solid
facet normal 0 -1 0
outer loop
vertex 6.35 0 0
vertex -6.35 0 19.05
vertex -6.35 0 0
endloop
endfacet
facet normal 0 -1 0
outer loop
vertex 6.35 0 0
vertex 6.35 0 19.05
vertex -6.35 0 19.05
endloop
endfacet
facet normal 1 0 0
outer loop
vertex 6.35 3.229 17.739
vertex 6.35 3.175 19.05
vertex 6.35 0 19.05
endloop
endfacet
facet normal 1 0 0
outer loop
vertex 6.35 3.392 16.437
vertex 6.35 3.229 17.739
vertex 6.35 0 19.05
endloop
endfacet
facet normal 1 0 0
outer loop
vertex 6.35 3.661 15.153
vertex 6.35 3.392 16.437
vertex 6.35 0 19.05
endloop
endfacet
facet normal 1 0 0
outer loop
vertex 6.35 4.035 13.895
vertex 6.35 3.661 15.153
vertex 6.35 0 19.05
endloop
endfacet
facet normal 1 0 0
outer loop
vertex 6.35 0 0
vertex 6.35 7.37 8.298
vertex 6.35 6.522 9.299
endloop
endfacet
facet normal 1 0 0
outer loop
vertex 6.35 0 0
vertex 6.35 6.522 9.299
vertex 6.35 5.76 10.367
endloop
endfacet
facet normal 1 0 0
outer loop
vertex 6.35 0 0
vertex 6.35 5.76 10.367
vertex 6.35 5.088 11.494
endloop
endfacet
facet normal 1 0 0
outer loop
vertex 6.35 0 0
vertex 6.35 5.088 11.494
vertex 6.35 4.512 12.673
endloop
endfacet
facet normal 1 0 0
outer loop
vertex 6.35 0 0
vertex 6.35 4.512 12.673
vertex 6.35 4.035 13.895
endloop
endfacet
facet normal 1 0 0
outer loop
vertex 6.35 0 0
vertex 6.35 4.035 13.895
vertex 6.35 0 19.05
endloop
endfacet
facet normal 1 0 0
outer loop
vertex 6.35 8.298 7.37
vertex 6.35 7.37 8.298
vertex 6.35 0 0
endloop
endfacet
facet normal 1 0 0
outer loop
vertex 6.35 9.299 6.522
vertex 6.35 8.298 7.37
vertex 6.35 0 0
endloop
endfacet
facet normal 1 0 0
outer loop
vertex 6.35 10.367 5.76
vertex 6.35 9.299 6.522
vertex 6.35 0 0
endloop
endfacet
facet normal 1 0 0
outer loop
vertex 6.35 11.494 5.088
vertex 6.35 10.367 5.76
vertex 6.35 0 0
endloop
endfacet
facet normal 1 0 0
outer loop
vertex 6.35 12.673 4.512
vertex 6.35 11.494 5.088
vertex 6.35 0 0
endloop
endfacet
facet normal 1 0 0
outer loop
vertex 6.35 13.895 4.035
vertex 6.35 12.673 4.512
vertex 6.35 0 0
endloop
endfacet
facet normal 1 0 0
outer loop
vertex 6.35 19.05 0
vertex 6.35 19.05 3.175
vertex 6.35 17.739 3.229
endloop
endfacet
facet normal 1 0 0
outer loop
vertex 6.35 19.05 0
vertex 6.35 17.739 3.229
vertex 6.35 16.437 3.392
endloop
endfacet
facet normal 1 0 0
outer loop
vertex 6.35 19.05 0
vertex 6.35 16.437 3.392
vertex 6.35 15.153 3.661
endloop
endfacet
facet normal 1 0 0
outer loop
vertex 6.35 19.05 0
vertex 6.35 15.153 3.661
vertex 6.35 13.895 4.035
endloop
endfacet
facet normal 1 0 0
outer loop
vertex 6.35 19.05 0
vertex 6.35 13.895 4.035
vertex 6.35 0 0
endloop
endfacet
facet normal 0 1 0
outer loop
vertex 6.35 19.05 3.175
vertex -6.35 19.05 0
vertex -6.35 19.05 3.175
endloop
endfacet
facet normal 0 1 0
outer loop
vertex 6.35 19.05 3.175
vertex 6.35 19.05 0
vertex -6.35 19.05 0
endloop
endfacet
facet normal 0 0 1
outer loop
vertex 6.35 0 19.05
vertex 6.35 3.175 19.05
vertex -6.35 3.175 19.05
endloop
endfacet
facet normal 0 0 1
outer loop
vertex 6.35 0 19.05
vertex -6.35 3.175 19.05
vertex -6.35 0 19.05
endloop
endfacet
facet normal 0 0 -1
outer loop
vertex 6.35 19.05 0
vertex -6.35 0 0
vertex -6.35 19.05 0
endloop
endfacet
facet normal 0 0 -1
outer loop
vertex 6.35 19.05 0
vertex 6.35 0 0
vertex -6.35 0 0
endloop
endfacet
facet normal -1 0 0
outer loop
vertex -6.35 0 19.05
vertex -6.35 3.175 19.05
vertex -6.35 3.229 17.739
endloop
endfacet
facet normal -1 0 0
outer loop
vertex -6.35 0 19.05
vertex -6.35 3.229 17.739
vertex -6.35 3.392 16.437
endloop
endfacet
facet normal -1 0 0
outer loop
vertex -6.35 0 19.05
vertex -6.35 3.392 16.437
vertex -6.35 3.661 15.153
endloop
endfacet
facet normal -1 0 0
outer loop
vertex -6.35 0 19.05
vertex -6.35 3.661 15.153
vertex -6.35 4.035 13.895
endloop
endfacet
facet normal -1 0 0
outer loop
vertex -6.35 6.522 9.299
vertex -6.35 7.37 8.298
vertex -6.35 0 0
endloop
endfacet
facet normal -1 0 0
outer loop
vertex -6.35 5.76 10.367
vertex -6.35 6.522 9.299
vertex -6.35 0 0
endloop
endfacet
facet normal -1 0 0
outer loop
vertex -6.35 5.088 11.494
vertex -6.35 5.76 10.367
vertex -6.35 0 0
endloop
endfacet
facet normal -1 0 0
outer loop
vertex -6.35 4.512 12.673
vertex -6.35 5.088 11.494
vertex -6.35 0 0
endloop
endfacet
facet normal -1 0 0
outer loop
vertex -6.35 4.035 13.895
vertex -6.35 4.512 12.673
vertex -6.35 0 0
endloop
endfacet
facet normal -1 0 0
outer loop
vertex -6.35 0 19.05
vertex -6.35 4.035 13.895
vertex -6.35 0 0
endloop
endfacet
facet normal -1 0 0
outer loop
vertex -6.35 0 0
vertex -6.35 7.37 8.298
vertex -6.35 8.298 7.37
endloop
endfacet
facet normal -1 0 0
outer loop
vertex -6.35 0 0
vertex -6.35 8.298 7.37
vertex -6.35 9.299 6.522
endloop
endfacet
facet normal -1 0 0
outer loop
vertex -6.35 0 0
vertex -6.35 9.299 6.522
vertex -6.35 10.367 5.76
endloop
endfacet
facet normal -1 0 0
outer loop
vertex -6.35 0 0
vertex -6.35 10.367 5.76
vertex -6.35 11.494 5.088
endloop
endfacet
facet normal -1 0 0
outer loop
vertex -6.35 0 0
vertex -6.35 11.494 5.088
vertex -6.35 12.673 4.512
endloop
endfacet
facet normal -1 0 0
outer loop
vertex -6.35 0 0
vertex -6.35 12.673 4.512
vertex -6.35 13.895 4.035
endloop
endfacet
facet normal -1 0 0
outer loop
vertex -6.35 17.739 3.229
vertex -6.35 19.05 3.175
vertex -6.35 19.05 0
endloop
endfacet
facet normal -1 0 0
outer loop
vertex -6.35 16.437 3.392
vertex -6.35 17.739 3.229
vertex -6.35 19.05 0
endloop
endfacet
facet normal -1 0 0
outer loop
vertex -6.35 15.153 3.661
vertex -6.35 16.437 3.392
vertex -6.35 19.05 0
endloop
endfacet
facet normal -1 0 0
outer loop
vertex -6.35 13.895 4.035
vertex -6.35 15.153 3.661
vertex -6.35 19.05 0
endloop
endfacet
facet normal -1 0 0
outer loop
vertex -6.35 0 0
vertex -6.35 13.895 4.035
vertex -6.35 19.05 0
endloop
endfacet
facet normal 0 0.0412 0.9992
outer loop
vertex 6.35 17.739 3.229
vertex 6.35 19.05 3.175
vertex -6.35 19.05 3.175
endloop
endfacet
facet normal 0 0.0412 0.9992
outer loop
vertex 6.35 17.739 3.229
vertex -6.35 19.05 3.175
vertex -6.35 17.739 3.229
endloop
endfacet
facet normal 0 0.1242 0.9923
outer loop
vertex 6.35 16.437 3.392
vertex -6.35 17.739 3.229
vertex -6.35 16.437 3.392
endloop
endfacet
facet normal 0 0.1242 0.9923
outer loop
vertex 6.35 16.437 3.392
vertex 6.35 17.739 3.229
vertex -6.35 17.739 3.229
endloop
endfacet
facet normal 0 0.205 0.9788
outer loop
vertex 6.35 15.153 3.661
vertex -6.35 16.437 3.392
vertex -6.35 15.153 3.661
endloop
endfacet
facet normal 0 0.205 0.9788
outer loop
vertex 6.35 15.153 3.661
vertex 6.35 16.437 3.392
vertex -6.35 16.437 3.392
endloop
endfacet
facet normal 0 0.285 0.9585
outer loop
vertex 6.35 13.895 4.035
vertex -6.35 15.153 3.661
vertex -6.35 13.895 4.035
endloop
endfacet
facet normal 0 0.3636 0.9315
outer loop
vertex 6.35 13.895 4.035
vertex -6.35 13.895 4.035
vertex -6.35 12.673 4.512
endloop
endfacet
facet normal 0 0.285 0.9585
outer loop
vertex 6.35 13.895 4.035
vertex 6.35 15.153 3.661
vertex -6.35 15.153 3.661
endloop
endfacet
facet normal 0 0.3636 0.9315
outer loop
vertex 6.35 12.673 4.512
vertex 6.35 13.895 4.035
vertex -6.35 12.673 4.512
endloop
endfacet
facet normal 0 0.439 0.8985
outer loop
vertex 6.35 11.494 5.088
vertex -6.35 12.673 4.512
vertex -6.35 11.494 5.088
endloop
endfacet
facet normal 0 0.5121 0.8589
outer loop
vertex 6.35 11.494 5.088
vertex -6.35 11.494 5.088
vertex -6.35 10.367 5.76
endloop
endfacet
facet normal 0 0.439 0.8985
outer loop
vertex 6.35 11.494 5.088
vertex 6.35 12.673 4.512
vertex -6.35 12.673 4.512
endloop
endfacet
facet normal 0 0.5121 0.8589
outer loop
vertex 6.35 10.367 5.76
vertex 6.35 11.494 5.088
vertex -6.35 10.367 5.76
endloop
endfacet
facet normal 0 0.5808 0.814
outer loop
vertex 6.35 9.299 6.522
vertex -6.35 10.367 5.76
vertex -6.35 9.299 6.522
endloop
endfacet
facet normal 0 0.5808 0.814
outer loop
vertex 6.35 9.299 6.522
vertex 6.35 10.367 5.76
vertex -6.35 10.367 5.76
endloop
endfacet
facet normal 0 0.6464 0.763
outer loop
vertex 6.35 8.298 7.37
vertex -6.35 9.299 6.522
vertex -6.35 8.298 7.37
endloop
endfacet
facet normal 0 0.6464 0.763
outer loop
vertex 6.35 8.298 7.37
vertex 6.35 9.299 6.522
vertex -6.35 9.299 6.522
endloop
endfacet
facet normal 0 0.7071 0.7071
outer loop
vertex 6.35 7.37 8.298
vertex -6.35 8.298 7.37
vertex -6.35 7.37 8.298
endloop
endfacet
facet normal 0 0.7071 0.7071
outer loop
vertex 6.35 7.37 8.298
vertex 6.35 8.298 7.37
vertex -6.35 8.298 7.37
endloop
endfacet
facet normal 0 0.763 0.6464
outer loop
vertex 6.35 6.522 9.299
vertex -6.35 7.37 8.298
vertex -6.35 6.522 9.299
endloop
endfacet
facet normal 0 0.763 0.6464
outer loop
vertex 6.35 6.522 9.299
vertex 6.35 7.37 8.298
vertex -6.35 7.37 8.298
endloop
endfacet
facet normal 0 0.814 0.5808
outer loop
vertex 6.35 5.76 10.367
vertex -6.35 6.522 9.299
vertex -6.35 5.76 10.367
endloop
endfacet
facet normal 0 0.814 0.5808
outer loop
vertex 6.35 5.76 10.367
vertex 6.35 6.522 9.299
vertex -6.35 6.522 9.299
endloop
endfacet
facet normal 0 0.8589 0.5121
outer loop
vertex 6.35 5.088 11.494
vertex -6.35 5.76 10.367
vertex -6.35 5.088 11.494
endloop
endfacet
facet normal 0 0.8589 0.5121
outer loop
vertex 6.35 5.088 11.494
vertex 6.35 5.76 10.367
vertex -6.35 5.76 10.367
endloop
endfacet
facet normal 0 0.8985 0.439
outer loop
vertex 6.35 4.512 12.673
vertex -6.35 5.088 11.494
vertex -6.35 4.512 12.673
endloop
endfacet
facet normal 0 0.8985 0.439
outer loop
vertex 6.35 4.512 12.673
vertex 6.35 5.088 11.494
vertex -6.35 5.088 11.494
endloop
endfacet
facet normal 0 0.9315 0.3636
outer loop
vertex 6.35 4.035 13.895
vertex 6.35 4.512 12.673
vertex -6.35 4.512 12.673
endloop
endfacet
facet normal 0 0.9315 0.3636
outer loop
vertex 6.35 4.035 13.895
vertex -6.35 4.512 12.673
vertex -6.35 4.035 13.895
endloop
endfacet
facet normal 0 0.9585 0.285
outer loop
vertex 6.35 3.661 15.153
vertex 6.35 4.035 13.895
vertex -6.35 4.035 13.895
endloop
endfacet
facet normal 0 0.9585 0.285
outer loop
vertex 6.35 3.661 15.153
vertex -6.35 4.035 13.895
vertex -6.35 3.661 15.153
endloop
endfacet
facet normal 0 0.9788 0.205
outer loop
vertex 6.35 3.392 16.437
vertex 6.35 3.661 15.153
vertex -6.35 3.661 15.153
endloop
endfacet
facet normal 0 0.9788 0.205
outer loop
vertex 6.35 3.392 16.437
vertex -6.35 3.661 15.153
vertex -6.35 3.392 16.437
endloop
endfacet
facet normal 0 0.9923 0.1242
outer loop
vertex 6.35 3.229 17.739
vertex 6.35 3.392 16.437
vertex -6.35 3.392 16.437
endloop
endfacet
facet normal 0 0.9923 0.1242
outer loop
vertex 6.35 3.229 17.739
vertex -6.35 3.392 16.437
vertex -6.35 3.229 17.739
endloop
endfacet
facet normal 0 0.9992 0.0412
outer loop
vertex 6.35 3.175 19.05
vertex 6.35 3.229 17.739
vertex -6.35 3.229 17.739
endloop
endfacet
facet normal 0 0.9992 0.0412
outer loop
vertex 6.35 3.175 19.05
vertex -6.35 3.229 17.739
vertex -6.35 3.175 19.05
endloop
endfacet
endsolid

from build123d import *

# Parameters (mm, degrees)
BOSS_EXTRUDE1_DEPTH = 6.35


with BuildPart() as part:
    # Sketch1 → Boss-Extrude1 (new body, symmetric)
    with BuildSketch(Plane(origin=(0, 0, 0), x_dir=(0, 0, -1), z_dir=(1, 0, 0))):
        with BuildLine():
            Line((0, 19.05), (-3.175, 19.05))
            ThreePointArc((-3.175, 19.05), (-7.824679849, 7.824679849), (-19.05, 3.175))
            Line((-19.05, 3.175), (-19.05, 0))
            Line((-19.05, 0), (0, 0))
            Line((0, 0), (0, 19.05))
        make_face()
    extrude(amount=BOSS_EXTRUDE1_DEPTH, both=True)


solid = part.part
